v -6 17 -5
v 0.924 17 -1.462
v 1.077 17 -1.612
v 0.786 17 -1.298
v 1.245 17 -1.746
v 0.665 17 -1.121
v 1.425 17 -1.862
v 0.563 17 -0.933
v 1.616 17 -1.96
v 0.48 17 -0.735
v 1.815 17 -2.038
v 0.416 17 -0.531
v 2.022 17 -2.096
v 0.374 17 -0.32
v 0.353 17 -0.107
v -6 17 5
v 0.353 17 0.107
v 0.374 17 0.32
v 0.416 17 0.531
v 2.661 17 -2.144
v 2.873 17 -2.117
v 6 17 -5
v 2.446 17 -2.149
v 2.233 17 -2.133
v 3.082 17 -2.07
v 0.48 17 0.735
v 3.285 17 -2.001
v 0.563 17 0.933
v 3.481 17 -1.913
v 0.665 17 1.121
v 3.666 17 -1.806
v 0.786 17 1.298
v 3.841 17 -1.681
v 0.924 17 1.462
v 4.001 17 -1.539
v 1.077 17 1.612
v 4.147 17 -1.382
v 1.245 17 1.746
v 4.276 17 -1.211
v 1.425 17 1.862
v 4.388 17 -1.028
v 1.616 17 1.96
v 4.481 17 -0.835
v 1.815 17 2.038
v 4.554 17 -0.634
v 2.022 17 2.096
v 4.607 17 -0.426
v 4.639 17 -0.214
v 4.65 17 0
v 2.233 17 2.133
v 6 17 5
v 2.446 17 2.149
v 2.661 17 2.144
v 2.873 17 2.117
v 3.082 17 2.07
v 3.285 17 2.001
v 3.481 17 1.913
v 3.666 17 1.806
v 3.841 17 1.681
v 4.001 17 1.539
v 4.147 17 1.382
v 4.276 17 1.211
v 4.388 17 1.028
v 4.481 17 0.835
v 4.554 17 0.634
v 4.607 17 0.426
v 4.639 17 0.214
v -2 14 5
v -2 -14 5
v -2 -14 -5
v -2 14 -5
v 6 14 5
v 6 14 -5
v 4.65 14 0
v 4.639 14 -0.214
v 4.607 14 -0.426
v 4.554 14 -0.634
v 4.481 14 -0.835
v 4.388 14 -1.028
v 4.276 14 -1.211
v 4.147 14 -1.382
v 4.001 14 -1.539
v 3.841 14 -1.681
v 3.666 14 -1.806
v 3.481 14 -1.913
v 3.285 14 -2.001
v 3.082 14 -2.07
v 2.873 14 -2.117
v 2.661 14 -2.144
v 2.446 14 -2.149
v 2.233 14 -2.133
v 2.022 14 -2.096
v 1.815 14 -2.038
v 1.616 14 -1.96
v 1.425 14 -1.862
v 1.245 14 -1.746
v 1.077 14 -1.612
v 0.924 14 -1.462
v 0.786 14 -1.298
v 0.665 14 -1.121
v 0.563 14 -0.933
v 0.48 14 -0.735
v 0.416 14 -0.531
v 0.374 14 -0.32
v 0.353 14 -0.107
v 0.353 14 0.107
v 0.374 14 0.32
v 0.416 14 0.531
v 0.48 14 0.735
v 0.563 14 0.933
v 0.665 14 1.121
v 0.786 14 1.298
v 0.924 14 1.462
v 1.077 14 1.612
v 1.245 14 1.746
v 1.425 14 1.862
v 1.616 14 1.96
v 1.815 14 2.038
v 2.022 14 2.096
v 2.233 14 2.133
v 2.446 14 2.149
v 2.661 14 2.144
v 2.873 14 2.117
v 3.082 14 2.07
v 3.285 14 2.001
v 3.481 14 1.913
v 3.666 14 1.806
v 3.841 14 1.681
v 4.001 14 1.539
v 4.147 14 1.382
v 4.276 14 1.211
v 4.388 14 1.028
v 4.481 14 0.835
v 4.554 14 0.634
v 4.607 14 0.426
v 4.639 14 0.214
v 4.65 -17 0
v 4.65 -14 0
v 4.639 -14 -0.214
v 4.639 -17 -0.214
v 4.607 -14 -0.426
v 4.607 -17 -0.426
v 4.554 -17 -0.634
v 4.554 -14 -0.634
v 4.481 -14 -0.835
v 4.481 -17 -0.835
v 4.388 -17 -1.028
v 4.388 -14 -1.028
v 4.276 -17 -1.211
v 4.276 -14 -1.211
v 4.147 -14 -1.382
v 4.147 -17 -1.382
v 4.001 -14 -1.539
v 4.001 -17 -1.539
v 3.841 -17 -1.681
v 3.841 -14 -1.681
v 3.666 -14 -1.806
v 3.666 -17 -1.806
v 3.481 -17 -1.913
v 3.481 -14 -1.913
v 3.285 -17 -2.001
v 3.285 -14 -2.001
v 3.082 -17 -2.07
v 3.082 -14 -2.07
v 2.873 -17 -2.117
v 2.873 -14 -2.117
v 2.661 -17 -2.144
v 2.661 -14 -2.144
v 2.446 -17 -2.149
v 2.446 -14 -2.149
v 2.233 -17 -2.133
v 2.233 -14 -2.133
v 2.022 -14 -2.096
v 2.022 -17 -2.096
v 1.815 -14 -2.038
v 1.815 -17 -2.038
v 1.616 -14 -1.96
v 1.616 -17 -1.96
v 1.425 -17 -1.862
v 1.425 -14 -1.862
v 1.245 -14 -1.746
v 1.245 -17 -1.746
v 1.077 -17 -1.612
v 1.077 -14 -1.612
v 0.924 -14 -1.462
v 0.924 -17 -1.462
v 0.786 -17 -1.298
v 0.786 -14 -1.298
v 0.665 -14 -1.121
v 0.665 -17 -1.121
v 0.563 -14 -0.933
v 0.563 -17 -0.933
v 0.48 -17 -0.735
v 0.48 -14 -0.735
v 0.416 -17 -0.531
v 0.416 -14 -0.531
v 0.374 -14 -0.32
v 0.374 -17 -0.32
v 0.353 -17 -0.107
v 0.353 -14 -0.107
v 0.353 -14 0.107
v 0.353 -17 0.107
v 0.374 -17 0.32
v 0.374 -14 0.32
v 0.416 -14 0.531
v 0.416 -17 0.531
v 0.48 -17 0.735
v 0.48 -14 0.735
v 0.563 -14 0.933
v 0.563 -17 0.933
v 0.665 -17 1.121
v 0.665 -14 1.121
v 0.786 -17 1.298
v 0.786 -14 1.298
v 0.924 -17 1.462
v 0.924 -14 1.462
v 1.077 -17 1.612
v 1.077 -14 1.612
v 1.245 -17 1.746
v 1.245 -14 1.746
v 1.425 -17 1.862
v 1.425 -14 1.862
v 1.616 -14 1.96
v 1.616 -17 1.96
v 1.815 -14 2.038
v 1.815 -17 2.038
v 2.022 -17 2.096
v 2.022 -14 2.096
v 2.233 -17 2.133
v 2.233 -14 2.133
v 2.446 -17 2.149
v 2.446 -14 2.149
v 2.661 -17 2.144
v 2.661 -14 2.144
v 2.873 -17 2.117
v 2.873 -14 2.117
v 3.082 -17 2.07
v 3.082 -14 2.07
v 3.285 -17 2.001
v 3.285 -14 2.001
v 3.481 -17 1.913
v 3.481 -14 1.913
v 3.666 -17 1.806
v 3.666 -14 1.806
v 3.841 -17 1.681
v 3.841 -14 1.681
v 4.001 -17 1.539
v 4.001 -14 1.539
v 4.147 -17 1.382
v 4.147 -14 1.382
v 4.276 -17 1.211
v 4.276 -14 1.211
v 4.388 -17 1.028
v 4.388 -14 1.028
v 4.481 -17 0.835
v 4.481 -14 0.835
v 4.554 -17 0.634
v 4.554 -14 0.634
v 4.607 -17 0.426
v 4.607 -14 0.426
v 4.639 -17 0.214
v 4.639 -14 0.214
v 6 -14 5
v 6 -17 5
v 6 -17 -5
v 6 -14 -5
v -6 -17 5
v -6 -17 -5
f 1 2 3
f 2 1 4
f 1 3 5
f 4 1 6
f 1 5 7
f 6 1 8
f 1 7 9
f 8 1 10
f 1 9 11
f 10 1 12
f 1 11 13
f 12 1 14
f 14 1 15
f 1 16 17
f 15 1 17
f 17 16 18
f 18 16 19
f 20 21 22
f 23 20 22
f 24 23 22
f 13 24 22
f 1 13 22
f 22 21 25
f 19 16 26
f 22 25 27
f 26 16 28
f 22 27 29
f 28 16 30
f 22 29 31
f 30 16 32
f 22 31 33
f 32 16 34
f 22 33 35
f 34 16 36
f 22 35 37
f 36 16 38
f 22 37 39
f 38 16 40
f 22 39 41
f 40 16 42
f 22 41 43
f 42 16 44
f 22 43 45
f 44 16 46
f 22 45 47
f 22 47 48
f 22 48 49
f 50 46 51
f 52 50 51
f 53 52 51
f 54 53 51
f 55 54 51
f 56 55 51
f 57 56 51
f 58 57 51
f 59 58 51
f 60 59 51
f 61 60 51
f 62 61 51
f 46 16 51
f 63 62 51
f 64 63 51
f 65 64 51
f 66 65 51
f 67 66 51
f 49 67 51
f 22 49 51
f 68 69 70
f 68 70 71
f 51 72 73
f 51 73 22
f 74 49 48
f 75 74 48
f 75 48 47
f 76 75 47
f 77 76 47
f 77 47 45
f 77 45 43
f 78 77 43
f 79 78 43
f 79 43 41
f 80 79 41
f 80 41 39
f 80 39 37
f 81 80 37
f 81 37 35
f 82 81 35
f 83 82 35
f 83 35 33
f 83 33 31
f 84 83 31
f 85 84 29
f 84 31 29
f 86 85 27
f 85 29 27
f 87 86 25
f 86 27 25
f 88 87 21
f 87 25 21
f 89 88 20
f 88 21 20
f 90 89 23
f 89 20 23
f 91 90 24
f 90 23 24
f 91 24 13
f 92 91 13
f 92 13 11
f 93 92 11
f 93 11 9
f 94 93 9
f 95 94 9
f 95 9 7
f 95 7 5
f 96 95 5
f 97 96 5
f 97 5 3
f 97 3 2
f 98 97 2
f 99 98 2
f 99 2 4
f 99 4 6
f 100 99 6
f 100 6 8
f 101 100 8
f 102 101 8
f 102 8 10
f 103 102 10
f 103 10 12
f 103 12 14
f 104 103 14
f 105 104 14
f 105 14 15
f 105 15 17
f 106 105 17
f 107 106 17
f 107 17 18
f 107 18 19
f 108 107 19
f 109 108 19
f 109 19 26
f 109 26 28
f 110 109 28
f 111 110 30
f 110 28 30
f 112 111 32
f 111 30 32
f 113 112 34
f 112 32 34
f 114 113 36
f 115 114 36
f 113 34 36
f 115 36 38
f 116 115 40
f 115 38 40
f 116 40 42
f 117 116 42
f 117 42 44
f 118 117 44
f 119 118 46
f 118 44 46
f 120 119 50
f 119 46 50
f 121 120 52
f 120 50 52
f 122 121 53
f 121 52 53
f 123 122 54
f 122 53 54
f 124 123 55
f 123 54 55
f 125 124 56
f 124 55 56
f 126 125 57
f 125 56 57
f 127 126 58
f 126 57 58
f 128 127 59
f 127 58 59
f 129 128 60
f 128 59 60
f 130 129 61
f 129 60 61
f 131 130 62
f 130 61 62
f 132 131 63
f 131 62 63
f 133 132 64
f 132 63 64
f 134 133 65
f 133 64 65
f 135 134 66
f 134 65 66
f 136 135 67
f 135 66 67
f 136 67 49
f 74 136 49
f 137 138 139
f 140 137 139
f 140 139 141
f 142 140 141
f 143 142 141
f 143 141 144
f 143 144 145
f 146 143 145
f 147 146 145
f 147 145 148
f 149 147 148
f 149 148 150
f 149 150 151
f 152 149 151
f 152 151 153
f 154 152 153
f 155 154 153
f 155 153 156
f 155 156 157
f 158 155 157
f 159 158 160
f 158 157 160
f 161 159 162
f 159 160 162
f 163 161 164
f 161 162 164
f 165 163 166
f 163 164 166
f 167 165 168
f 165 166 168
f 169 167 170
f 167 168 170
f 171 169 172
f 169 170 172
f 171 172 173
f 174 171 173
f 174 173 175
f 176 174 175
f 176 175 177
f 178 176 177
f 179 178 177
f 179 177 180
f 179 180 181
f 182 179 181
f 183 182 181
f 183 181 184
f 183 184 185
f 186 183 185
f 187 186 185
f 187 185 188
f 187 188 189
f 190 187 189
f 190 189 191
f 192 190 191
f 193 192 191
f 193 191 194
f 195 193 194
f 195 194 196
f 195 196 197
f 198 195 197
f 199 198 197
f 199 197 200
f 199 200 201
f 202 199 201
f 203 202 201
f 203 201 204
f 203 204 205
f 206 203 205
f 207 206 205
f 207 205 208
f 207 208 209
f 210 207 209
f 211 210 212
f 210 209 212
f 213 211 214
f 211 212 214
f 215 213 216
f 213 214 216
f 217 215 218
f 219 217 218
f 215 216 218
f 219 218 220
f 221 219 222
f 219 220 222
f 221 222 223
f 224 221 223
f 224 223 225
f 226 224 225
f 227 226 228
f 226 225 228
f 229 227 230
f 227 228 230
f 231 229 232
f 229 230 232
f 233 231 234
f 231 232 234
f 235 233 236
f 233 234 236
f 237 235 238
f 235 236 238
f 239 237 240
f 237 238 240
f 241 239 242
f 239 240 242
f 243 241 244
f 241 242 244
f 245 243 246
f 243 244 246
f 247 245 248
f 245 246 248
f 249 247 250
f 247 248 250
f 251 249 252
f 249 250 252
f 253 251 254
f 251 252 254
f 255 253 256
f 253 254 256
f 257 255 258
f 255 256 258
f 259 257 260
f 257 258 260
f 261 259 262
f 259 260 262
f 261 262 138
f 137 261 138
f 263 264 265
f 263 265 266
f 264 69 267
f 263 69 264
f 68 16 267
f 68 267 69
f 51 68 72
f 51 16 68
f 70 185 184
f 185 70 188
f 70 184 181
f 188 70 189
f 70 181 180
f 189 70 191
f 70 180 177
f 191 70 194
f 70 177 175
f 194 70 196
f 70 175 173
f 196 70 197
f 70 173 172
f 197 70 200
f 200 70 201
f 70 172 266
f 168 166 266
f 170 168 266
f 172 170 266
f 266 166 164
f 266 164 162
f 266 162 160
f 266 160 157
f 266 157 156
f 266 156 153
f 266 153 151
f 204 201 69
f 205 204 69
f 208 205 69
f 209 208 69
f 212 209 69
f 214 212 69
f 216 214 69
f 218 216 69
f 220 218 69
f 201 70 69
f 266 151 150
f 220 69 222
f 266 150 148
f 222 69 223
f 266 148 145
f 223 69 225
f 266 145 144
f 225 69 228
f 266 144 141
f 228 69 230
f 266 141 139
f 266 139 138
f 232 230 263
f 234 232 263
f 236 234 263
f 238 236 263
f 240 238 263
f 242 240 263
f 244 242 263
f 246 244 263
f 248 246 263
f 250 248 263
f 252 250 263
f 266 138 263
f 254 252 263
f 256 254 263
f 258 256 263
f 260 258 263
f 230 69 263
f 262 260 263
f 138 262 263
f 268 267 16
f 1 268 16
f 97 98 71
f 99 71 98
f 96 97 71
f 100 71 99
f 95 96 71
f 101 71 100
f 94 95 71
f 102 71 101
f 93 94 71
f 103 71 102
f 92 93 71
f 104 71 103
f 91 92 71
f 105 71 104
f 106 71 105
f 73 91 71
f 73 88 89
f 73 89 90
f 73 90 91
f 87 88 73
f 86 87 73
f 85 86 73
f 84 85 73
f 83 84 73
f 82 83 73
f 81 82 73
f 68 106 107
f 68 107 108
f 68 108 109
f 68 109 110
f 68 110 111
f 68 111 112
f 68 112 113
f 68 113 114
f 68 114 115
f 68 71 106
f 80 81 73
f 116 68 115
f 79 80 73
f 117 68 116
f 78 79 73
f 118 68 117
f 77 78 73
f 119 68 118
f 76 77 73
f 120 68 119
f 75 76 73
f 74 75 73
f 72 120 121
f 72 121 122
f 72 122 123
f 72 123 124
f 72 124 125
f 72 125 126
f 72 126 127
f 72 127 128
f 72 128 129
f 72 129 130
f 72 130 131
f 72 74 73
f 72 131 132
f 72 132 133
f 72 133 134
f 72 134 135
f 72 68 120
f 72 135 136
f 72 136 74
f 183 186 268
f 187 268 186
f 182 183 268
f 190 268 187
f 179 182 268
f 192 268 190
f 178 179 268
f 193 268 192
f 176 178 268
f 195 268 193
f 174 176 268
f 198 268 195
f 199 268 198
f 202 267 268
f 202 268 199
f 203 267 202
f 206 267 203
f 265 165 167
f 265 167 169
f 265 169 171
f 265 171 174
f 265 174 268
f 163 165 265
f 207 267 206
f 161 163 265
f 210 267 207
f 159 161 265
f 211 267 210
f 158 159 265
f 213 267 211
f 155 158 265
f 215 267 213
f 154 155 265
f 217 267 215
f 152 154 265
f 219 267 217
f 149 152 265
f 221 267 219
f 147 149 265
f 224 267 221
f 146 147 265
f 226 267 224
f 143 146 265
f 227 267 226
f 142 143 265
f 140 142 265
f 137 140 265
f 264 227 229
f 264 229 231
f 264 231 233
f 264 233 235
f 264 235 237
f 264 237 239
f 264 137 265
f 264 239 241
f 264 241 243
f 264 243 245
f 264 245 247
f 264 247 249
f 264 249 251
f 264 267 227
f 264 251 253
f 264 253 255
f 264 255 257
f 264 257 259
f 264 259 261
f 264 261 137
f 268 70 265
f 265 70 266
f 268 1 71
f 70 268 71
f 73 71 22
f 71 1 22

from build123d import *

# Parameters (mm, degrees)
SKETCH1_W               = 12
SKETCH1_H               = 34
BOSS_EXTRUDE1_DEPTH     = 5
SKETCH2_W               = 16
SKETCH2_H               = 28
CUT_EXTRUDE1_DEPTH      = 1
CUT_EXTRUDE1_DEPTH_BACK = 11
SKETCH3_R               = 2.15
CUT_EXTRUDE2_DEPTH      = 35


with BuildPart() as part:
    # Sketch1 → Boss-Extrude1 (new body, symmetric)
    with BuildSketch(Plane.XY):
        Rectangle(SKETCH1_W, SKETCH1_H)
    extrude(amount=BOSS_EXTRUDE1_DEPTH, both=True)

    # Sketch2 → Cut-Extrude1 (cut, two sides)
    with BuildSketch(Plane.XY.offset(5)) as cut_extrude1_sk:
        with Locations((6, 0)):
            Rectangle(SKETCH2_W, SKETCH2_H)
    extrude(amount=CUT_EXTRUDE1_DEPTH, mode=Mode.SUBTRACT)
    extrude(cut_extrude1_sk.sketch, amount=-CUT_EXTRUDE1_DEPTH_BACK, mode=Mode.SUBTRACT)

    # Sketch3 → Cut-Extrude2 (cut, through all)
    with BuildSketch(Plane(origin=(0, 17, 0), x_dir=(1, 0, 0), z_dir=(0, 1, 0))):
        with Locations((2.5, 0)):
            Circle(SKETCH3_R)
    extrude(amount=-CUT_EXTRUDE2_DEPTH, mode=Mode.SUBTRACT)


solid = part.part
